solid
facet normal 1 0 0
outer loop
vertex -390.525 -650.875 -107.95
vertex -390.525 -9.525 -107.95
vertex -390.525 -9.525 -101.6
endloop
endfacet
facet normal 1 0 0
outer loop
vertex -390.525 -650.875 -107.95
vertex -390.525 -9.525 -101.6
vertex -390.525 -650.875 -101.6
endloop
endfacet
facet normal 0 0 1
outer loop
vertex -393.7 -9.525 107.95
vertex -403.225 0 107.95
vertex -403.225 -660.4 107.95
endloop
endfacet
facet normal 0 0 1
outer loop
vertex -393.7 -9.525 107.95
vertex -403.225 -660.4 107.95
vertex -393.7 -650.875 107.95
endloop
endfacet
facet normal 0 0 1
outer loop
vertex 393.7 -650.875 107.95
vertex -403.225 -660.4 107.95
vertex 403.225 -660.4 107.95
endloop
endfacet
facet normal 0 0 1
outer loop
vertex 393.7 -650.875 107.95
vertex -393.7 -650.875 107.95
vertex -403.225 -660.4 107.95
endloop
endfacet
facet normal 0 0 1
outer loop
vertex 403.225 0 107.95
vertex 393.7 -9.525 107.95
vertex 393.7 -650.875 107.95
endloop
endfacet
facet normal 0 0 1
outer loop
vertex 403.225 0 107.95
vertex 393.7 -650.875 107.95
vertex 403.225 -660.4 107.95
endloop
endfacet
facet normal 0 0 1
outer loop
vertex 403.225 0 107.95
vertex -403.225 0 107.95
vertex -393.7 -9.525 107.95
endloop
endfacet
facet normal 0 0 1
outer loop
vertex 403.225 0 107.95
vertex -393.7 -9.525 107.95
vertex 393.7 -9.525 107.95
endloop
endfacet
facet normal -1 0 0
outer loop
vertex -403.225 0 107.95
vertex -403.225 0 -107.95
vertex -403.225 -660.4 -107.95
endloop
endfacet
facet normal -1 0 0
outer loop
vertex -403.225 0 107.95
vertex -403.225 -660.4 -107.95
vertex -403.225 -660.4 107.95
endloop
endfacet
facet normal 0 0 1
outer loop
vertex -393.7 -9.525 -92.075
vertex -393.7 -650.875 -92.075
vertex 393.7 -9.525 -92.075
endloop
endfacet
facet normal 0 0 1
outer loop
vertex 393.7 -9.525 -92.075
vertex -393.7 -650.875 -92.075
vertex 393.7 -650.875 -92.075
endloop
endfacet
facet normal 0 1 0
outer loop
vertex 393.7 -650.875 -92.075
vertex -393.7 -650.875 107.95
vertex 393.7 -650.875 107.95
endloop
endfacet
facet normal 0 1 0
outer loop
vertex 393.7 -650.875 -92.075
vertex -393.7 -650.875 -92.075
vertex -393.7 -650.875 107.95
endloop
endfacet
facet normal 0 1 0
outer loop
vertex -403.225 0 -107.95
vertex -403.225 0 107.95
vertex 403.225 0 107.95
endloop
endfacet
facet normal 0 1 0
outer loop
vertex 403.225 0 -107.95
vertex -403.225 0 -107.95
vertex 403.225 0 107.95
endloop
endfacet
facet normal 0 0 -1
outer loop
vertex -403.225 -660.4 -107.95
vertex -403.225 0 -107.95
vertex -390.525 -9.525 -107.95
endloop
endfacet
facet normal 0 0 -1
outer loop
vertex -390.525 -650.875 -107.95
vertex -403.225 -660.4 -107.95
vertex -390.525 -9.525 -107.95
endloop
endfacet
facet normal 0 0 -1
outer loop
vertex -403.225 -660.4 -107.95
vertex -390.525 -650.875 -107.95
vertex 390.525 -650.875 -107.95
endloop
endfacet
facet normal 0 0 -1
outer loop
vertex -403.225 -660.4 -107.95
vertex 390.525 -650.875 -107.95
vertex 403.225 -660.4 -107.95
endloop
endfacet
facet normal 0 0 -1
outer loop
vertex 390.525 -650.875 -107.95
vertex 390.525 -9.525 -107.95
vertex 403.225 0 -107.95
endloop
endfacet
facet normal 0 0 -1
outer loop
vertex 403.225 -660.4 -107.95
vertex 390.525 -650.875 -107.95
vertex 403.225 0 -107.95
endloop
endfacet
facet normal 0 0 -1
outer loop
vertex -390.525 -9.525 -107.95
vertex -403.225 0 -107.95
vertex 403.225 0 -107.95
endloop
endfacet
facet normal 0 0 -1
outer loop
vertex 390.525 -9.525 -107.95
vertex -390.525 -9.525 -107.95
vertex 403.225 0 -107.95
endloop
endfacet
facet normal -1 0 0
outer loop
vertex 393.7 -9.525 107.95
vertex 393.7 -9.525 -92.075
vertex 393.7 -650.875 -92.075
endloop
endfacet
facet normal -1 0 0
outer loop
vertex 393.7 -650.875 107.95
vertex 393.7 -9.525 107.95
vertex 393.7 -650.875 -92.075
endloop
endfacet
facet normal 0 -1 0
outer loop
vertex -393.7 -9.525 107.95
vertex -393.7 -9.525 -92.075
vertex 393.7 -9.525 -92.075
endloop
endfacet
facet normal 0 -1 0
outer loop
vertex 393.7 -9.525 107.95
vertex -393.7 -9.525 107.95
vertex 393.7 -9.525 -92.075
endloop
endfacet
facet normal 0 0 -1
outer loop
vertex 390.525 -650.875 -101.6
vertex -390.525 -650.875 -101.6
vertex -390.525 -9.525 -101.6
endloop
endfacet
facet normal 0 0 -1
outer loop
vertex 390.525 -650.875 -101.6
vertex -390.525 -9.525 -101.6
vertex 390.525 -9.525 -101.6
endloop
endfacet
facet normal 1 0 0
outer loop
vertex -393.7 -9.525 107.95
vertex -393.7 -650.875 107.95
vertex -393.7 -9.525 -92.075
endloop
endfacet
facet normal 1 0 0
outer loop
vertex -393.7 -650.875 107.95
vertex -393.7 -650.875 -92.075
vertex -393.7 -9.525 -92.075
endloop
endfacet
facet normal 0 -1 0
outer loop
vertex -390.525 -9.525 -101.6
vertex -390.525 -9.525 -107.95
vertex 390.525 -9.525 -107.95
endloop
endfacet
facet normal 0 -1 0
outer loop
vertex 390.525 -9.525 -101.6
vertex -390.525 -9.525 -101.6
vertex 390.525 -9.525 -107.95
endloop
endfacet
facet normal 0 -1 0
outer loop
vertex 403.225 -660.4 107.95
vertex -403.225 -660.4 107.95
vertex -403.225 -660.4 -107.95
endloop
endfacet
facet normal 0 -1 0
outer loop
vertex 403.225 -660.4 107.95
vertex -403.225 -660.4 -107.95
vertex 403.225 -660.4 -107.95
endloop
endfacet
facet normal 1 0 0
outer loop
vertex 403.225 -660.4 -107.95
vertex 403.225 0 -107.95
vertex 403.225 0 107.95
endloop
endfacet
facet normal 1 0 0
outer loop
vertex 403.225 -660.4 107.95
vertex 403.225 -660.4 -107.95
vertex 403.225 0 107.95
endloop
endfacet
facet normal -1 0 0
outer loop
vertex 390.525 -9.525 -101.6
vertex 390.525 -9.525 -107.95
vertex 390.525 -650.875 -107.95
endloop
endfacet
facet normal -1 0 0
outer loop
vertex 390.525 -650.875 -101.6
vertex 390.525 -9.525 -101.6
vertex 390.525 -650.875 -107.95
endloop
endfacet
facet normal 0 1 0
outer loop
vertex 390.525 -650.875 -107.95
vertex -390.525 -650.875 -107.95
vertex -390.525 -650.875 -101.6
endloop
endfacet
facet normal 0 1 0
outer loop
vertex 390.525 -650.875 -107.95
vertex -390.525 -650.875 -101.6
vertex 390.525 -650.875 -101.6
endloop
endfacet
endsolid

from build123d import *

# Parameters (mm, degrees)
F0_W     = 806.45
F0_H     = 215.9
F1_DEPTH = 660.4
F2_W     = 781.05
F2_H     = 641.35
F3_DEPTH = 6.35
F4_T     = -9.525


# Not quite as in the source:
# - a shell that OpenCascade refuses in one call is made with other operations: the cavity is built on its own and cut out


with BuildPart() as f1:
    # F0 (on Front) → F1 (new body)
    with BuildSketch(Plane.XZ):
        Rectangle(F0_W, F0_H)
    extrude(amount=F1_DEPTH)

    # F2 (on face) → F3 (cut)
    with BuildSketch(Plane(origin=(0, 0, -107.95), x_dir=(1, 0, 0), z_dir=(0, 0, -1))):
        with Locations((0, 330.2)):
            Rectangle(F2_W, F2_H)
    extrude(amount=-F3_DEPTH, mode=Mode.SUBTRACT)

    # F4: a shell. OpenCascade refuses it in one call, so the cavity is built on its own and cut out:
    # the body offset inwards by the wall thickness, plus a prism from it out through each open face.
    f4_core = offset(f1.part, amount=F4_T, kind=Kind.INTERSECTION, mode=Mode.PRIVATE)
    f4_exits = [f4_core.faces().sort_by_distance(p)[0] for p in [
        (0, -330.2, 98.425),
    ]]
    add(f4_core, mode=Mode.SUBTRACT)
    extrude(f4_exits, amount=-F4_T, mode=Mode.SUBTRACT)


solid = f1.part
